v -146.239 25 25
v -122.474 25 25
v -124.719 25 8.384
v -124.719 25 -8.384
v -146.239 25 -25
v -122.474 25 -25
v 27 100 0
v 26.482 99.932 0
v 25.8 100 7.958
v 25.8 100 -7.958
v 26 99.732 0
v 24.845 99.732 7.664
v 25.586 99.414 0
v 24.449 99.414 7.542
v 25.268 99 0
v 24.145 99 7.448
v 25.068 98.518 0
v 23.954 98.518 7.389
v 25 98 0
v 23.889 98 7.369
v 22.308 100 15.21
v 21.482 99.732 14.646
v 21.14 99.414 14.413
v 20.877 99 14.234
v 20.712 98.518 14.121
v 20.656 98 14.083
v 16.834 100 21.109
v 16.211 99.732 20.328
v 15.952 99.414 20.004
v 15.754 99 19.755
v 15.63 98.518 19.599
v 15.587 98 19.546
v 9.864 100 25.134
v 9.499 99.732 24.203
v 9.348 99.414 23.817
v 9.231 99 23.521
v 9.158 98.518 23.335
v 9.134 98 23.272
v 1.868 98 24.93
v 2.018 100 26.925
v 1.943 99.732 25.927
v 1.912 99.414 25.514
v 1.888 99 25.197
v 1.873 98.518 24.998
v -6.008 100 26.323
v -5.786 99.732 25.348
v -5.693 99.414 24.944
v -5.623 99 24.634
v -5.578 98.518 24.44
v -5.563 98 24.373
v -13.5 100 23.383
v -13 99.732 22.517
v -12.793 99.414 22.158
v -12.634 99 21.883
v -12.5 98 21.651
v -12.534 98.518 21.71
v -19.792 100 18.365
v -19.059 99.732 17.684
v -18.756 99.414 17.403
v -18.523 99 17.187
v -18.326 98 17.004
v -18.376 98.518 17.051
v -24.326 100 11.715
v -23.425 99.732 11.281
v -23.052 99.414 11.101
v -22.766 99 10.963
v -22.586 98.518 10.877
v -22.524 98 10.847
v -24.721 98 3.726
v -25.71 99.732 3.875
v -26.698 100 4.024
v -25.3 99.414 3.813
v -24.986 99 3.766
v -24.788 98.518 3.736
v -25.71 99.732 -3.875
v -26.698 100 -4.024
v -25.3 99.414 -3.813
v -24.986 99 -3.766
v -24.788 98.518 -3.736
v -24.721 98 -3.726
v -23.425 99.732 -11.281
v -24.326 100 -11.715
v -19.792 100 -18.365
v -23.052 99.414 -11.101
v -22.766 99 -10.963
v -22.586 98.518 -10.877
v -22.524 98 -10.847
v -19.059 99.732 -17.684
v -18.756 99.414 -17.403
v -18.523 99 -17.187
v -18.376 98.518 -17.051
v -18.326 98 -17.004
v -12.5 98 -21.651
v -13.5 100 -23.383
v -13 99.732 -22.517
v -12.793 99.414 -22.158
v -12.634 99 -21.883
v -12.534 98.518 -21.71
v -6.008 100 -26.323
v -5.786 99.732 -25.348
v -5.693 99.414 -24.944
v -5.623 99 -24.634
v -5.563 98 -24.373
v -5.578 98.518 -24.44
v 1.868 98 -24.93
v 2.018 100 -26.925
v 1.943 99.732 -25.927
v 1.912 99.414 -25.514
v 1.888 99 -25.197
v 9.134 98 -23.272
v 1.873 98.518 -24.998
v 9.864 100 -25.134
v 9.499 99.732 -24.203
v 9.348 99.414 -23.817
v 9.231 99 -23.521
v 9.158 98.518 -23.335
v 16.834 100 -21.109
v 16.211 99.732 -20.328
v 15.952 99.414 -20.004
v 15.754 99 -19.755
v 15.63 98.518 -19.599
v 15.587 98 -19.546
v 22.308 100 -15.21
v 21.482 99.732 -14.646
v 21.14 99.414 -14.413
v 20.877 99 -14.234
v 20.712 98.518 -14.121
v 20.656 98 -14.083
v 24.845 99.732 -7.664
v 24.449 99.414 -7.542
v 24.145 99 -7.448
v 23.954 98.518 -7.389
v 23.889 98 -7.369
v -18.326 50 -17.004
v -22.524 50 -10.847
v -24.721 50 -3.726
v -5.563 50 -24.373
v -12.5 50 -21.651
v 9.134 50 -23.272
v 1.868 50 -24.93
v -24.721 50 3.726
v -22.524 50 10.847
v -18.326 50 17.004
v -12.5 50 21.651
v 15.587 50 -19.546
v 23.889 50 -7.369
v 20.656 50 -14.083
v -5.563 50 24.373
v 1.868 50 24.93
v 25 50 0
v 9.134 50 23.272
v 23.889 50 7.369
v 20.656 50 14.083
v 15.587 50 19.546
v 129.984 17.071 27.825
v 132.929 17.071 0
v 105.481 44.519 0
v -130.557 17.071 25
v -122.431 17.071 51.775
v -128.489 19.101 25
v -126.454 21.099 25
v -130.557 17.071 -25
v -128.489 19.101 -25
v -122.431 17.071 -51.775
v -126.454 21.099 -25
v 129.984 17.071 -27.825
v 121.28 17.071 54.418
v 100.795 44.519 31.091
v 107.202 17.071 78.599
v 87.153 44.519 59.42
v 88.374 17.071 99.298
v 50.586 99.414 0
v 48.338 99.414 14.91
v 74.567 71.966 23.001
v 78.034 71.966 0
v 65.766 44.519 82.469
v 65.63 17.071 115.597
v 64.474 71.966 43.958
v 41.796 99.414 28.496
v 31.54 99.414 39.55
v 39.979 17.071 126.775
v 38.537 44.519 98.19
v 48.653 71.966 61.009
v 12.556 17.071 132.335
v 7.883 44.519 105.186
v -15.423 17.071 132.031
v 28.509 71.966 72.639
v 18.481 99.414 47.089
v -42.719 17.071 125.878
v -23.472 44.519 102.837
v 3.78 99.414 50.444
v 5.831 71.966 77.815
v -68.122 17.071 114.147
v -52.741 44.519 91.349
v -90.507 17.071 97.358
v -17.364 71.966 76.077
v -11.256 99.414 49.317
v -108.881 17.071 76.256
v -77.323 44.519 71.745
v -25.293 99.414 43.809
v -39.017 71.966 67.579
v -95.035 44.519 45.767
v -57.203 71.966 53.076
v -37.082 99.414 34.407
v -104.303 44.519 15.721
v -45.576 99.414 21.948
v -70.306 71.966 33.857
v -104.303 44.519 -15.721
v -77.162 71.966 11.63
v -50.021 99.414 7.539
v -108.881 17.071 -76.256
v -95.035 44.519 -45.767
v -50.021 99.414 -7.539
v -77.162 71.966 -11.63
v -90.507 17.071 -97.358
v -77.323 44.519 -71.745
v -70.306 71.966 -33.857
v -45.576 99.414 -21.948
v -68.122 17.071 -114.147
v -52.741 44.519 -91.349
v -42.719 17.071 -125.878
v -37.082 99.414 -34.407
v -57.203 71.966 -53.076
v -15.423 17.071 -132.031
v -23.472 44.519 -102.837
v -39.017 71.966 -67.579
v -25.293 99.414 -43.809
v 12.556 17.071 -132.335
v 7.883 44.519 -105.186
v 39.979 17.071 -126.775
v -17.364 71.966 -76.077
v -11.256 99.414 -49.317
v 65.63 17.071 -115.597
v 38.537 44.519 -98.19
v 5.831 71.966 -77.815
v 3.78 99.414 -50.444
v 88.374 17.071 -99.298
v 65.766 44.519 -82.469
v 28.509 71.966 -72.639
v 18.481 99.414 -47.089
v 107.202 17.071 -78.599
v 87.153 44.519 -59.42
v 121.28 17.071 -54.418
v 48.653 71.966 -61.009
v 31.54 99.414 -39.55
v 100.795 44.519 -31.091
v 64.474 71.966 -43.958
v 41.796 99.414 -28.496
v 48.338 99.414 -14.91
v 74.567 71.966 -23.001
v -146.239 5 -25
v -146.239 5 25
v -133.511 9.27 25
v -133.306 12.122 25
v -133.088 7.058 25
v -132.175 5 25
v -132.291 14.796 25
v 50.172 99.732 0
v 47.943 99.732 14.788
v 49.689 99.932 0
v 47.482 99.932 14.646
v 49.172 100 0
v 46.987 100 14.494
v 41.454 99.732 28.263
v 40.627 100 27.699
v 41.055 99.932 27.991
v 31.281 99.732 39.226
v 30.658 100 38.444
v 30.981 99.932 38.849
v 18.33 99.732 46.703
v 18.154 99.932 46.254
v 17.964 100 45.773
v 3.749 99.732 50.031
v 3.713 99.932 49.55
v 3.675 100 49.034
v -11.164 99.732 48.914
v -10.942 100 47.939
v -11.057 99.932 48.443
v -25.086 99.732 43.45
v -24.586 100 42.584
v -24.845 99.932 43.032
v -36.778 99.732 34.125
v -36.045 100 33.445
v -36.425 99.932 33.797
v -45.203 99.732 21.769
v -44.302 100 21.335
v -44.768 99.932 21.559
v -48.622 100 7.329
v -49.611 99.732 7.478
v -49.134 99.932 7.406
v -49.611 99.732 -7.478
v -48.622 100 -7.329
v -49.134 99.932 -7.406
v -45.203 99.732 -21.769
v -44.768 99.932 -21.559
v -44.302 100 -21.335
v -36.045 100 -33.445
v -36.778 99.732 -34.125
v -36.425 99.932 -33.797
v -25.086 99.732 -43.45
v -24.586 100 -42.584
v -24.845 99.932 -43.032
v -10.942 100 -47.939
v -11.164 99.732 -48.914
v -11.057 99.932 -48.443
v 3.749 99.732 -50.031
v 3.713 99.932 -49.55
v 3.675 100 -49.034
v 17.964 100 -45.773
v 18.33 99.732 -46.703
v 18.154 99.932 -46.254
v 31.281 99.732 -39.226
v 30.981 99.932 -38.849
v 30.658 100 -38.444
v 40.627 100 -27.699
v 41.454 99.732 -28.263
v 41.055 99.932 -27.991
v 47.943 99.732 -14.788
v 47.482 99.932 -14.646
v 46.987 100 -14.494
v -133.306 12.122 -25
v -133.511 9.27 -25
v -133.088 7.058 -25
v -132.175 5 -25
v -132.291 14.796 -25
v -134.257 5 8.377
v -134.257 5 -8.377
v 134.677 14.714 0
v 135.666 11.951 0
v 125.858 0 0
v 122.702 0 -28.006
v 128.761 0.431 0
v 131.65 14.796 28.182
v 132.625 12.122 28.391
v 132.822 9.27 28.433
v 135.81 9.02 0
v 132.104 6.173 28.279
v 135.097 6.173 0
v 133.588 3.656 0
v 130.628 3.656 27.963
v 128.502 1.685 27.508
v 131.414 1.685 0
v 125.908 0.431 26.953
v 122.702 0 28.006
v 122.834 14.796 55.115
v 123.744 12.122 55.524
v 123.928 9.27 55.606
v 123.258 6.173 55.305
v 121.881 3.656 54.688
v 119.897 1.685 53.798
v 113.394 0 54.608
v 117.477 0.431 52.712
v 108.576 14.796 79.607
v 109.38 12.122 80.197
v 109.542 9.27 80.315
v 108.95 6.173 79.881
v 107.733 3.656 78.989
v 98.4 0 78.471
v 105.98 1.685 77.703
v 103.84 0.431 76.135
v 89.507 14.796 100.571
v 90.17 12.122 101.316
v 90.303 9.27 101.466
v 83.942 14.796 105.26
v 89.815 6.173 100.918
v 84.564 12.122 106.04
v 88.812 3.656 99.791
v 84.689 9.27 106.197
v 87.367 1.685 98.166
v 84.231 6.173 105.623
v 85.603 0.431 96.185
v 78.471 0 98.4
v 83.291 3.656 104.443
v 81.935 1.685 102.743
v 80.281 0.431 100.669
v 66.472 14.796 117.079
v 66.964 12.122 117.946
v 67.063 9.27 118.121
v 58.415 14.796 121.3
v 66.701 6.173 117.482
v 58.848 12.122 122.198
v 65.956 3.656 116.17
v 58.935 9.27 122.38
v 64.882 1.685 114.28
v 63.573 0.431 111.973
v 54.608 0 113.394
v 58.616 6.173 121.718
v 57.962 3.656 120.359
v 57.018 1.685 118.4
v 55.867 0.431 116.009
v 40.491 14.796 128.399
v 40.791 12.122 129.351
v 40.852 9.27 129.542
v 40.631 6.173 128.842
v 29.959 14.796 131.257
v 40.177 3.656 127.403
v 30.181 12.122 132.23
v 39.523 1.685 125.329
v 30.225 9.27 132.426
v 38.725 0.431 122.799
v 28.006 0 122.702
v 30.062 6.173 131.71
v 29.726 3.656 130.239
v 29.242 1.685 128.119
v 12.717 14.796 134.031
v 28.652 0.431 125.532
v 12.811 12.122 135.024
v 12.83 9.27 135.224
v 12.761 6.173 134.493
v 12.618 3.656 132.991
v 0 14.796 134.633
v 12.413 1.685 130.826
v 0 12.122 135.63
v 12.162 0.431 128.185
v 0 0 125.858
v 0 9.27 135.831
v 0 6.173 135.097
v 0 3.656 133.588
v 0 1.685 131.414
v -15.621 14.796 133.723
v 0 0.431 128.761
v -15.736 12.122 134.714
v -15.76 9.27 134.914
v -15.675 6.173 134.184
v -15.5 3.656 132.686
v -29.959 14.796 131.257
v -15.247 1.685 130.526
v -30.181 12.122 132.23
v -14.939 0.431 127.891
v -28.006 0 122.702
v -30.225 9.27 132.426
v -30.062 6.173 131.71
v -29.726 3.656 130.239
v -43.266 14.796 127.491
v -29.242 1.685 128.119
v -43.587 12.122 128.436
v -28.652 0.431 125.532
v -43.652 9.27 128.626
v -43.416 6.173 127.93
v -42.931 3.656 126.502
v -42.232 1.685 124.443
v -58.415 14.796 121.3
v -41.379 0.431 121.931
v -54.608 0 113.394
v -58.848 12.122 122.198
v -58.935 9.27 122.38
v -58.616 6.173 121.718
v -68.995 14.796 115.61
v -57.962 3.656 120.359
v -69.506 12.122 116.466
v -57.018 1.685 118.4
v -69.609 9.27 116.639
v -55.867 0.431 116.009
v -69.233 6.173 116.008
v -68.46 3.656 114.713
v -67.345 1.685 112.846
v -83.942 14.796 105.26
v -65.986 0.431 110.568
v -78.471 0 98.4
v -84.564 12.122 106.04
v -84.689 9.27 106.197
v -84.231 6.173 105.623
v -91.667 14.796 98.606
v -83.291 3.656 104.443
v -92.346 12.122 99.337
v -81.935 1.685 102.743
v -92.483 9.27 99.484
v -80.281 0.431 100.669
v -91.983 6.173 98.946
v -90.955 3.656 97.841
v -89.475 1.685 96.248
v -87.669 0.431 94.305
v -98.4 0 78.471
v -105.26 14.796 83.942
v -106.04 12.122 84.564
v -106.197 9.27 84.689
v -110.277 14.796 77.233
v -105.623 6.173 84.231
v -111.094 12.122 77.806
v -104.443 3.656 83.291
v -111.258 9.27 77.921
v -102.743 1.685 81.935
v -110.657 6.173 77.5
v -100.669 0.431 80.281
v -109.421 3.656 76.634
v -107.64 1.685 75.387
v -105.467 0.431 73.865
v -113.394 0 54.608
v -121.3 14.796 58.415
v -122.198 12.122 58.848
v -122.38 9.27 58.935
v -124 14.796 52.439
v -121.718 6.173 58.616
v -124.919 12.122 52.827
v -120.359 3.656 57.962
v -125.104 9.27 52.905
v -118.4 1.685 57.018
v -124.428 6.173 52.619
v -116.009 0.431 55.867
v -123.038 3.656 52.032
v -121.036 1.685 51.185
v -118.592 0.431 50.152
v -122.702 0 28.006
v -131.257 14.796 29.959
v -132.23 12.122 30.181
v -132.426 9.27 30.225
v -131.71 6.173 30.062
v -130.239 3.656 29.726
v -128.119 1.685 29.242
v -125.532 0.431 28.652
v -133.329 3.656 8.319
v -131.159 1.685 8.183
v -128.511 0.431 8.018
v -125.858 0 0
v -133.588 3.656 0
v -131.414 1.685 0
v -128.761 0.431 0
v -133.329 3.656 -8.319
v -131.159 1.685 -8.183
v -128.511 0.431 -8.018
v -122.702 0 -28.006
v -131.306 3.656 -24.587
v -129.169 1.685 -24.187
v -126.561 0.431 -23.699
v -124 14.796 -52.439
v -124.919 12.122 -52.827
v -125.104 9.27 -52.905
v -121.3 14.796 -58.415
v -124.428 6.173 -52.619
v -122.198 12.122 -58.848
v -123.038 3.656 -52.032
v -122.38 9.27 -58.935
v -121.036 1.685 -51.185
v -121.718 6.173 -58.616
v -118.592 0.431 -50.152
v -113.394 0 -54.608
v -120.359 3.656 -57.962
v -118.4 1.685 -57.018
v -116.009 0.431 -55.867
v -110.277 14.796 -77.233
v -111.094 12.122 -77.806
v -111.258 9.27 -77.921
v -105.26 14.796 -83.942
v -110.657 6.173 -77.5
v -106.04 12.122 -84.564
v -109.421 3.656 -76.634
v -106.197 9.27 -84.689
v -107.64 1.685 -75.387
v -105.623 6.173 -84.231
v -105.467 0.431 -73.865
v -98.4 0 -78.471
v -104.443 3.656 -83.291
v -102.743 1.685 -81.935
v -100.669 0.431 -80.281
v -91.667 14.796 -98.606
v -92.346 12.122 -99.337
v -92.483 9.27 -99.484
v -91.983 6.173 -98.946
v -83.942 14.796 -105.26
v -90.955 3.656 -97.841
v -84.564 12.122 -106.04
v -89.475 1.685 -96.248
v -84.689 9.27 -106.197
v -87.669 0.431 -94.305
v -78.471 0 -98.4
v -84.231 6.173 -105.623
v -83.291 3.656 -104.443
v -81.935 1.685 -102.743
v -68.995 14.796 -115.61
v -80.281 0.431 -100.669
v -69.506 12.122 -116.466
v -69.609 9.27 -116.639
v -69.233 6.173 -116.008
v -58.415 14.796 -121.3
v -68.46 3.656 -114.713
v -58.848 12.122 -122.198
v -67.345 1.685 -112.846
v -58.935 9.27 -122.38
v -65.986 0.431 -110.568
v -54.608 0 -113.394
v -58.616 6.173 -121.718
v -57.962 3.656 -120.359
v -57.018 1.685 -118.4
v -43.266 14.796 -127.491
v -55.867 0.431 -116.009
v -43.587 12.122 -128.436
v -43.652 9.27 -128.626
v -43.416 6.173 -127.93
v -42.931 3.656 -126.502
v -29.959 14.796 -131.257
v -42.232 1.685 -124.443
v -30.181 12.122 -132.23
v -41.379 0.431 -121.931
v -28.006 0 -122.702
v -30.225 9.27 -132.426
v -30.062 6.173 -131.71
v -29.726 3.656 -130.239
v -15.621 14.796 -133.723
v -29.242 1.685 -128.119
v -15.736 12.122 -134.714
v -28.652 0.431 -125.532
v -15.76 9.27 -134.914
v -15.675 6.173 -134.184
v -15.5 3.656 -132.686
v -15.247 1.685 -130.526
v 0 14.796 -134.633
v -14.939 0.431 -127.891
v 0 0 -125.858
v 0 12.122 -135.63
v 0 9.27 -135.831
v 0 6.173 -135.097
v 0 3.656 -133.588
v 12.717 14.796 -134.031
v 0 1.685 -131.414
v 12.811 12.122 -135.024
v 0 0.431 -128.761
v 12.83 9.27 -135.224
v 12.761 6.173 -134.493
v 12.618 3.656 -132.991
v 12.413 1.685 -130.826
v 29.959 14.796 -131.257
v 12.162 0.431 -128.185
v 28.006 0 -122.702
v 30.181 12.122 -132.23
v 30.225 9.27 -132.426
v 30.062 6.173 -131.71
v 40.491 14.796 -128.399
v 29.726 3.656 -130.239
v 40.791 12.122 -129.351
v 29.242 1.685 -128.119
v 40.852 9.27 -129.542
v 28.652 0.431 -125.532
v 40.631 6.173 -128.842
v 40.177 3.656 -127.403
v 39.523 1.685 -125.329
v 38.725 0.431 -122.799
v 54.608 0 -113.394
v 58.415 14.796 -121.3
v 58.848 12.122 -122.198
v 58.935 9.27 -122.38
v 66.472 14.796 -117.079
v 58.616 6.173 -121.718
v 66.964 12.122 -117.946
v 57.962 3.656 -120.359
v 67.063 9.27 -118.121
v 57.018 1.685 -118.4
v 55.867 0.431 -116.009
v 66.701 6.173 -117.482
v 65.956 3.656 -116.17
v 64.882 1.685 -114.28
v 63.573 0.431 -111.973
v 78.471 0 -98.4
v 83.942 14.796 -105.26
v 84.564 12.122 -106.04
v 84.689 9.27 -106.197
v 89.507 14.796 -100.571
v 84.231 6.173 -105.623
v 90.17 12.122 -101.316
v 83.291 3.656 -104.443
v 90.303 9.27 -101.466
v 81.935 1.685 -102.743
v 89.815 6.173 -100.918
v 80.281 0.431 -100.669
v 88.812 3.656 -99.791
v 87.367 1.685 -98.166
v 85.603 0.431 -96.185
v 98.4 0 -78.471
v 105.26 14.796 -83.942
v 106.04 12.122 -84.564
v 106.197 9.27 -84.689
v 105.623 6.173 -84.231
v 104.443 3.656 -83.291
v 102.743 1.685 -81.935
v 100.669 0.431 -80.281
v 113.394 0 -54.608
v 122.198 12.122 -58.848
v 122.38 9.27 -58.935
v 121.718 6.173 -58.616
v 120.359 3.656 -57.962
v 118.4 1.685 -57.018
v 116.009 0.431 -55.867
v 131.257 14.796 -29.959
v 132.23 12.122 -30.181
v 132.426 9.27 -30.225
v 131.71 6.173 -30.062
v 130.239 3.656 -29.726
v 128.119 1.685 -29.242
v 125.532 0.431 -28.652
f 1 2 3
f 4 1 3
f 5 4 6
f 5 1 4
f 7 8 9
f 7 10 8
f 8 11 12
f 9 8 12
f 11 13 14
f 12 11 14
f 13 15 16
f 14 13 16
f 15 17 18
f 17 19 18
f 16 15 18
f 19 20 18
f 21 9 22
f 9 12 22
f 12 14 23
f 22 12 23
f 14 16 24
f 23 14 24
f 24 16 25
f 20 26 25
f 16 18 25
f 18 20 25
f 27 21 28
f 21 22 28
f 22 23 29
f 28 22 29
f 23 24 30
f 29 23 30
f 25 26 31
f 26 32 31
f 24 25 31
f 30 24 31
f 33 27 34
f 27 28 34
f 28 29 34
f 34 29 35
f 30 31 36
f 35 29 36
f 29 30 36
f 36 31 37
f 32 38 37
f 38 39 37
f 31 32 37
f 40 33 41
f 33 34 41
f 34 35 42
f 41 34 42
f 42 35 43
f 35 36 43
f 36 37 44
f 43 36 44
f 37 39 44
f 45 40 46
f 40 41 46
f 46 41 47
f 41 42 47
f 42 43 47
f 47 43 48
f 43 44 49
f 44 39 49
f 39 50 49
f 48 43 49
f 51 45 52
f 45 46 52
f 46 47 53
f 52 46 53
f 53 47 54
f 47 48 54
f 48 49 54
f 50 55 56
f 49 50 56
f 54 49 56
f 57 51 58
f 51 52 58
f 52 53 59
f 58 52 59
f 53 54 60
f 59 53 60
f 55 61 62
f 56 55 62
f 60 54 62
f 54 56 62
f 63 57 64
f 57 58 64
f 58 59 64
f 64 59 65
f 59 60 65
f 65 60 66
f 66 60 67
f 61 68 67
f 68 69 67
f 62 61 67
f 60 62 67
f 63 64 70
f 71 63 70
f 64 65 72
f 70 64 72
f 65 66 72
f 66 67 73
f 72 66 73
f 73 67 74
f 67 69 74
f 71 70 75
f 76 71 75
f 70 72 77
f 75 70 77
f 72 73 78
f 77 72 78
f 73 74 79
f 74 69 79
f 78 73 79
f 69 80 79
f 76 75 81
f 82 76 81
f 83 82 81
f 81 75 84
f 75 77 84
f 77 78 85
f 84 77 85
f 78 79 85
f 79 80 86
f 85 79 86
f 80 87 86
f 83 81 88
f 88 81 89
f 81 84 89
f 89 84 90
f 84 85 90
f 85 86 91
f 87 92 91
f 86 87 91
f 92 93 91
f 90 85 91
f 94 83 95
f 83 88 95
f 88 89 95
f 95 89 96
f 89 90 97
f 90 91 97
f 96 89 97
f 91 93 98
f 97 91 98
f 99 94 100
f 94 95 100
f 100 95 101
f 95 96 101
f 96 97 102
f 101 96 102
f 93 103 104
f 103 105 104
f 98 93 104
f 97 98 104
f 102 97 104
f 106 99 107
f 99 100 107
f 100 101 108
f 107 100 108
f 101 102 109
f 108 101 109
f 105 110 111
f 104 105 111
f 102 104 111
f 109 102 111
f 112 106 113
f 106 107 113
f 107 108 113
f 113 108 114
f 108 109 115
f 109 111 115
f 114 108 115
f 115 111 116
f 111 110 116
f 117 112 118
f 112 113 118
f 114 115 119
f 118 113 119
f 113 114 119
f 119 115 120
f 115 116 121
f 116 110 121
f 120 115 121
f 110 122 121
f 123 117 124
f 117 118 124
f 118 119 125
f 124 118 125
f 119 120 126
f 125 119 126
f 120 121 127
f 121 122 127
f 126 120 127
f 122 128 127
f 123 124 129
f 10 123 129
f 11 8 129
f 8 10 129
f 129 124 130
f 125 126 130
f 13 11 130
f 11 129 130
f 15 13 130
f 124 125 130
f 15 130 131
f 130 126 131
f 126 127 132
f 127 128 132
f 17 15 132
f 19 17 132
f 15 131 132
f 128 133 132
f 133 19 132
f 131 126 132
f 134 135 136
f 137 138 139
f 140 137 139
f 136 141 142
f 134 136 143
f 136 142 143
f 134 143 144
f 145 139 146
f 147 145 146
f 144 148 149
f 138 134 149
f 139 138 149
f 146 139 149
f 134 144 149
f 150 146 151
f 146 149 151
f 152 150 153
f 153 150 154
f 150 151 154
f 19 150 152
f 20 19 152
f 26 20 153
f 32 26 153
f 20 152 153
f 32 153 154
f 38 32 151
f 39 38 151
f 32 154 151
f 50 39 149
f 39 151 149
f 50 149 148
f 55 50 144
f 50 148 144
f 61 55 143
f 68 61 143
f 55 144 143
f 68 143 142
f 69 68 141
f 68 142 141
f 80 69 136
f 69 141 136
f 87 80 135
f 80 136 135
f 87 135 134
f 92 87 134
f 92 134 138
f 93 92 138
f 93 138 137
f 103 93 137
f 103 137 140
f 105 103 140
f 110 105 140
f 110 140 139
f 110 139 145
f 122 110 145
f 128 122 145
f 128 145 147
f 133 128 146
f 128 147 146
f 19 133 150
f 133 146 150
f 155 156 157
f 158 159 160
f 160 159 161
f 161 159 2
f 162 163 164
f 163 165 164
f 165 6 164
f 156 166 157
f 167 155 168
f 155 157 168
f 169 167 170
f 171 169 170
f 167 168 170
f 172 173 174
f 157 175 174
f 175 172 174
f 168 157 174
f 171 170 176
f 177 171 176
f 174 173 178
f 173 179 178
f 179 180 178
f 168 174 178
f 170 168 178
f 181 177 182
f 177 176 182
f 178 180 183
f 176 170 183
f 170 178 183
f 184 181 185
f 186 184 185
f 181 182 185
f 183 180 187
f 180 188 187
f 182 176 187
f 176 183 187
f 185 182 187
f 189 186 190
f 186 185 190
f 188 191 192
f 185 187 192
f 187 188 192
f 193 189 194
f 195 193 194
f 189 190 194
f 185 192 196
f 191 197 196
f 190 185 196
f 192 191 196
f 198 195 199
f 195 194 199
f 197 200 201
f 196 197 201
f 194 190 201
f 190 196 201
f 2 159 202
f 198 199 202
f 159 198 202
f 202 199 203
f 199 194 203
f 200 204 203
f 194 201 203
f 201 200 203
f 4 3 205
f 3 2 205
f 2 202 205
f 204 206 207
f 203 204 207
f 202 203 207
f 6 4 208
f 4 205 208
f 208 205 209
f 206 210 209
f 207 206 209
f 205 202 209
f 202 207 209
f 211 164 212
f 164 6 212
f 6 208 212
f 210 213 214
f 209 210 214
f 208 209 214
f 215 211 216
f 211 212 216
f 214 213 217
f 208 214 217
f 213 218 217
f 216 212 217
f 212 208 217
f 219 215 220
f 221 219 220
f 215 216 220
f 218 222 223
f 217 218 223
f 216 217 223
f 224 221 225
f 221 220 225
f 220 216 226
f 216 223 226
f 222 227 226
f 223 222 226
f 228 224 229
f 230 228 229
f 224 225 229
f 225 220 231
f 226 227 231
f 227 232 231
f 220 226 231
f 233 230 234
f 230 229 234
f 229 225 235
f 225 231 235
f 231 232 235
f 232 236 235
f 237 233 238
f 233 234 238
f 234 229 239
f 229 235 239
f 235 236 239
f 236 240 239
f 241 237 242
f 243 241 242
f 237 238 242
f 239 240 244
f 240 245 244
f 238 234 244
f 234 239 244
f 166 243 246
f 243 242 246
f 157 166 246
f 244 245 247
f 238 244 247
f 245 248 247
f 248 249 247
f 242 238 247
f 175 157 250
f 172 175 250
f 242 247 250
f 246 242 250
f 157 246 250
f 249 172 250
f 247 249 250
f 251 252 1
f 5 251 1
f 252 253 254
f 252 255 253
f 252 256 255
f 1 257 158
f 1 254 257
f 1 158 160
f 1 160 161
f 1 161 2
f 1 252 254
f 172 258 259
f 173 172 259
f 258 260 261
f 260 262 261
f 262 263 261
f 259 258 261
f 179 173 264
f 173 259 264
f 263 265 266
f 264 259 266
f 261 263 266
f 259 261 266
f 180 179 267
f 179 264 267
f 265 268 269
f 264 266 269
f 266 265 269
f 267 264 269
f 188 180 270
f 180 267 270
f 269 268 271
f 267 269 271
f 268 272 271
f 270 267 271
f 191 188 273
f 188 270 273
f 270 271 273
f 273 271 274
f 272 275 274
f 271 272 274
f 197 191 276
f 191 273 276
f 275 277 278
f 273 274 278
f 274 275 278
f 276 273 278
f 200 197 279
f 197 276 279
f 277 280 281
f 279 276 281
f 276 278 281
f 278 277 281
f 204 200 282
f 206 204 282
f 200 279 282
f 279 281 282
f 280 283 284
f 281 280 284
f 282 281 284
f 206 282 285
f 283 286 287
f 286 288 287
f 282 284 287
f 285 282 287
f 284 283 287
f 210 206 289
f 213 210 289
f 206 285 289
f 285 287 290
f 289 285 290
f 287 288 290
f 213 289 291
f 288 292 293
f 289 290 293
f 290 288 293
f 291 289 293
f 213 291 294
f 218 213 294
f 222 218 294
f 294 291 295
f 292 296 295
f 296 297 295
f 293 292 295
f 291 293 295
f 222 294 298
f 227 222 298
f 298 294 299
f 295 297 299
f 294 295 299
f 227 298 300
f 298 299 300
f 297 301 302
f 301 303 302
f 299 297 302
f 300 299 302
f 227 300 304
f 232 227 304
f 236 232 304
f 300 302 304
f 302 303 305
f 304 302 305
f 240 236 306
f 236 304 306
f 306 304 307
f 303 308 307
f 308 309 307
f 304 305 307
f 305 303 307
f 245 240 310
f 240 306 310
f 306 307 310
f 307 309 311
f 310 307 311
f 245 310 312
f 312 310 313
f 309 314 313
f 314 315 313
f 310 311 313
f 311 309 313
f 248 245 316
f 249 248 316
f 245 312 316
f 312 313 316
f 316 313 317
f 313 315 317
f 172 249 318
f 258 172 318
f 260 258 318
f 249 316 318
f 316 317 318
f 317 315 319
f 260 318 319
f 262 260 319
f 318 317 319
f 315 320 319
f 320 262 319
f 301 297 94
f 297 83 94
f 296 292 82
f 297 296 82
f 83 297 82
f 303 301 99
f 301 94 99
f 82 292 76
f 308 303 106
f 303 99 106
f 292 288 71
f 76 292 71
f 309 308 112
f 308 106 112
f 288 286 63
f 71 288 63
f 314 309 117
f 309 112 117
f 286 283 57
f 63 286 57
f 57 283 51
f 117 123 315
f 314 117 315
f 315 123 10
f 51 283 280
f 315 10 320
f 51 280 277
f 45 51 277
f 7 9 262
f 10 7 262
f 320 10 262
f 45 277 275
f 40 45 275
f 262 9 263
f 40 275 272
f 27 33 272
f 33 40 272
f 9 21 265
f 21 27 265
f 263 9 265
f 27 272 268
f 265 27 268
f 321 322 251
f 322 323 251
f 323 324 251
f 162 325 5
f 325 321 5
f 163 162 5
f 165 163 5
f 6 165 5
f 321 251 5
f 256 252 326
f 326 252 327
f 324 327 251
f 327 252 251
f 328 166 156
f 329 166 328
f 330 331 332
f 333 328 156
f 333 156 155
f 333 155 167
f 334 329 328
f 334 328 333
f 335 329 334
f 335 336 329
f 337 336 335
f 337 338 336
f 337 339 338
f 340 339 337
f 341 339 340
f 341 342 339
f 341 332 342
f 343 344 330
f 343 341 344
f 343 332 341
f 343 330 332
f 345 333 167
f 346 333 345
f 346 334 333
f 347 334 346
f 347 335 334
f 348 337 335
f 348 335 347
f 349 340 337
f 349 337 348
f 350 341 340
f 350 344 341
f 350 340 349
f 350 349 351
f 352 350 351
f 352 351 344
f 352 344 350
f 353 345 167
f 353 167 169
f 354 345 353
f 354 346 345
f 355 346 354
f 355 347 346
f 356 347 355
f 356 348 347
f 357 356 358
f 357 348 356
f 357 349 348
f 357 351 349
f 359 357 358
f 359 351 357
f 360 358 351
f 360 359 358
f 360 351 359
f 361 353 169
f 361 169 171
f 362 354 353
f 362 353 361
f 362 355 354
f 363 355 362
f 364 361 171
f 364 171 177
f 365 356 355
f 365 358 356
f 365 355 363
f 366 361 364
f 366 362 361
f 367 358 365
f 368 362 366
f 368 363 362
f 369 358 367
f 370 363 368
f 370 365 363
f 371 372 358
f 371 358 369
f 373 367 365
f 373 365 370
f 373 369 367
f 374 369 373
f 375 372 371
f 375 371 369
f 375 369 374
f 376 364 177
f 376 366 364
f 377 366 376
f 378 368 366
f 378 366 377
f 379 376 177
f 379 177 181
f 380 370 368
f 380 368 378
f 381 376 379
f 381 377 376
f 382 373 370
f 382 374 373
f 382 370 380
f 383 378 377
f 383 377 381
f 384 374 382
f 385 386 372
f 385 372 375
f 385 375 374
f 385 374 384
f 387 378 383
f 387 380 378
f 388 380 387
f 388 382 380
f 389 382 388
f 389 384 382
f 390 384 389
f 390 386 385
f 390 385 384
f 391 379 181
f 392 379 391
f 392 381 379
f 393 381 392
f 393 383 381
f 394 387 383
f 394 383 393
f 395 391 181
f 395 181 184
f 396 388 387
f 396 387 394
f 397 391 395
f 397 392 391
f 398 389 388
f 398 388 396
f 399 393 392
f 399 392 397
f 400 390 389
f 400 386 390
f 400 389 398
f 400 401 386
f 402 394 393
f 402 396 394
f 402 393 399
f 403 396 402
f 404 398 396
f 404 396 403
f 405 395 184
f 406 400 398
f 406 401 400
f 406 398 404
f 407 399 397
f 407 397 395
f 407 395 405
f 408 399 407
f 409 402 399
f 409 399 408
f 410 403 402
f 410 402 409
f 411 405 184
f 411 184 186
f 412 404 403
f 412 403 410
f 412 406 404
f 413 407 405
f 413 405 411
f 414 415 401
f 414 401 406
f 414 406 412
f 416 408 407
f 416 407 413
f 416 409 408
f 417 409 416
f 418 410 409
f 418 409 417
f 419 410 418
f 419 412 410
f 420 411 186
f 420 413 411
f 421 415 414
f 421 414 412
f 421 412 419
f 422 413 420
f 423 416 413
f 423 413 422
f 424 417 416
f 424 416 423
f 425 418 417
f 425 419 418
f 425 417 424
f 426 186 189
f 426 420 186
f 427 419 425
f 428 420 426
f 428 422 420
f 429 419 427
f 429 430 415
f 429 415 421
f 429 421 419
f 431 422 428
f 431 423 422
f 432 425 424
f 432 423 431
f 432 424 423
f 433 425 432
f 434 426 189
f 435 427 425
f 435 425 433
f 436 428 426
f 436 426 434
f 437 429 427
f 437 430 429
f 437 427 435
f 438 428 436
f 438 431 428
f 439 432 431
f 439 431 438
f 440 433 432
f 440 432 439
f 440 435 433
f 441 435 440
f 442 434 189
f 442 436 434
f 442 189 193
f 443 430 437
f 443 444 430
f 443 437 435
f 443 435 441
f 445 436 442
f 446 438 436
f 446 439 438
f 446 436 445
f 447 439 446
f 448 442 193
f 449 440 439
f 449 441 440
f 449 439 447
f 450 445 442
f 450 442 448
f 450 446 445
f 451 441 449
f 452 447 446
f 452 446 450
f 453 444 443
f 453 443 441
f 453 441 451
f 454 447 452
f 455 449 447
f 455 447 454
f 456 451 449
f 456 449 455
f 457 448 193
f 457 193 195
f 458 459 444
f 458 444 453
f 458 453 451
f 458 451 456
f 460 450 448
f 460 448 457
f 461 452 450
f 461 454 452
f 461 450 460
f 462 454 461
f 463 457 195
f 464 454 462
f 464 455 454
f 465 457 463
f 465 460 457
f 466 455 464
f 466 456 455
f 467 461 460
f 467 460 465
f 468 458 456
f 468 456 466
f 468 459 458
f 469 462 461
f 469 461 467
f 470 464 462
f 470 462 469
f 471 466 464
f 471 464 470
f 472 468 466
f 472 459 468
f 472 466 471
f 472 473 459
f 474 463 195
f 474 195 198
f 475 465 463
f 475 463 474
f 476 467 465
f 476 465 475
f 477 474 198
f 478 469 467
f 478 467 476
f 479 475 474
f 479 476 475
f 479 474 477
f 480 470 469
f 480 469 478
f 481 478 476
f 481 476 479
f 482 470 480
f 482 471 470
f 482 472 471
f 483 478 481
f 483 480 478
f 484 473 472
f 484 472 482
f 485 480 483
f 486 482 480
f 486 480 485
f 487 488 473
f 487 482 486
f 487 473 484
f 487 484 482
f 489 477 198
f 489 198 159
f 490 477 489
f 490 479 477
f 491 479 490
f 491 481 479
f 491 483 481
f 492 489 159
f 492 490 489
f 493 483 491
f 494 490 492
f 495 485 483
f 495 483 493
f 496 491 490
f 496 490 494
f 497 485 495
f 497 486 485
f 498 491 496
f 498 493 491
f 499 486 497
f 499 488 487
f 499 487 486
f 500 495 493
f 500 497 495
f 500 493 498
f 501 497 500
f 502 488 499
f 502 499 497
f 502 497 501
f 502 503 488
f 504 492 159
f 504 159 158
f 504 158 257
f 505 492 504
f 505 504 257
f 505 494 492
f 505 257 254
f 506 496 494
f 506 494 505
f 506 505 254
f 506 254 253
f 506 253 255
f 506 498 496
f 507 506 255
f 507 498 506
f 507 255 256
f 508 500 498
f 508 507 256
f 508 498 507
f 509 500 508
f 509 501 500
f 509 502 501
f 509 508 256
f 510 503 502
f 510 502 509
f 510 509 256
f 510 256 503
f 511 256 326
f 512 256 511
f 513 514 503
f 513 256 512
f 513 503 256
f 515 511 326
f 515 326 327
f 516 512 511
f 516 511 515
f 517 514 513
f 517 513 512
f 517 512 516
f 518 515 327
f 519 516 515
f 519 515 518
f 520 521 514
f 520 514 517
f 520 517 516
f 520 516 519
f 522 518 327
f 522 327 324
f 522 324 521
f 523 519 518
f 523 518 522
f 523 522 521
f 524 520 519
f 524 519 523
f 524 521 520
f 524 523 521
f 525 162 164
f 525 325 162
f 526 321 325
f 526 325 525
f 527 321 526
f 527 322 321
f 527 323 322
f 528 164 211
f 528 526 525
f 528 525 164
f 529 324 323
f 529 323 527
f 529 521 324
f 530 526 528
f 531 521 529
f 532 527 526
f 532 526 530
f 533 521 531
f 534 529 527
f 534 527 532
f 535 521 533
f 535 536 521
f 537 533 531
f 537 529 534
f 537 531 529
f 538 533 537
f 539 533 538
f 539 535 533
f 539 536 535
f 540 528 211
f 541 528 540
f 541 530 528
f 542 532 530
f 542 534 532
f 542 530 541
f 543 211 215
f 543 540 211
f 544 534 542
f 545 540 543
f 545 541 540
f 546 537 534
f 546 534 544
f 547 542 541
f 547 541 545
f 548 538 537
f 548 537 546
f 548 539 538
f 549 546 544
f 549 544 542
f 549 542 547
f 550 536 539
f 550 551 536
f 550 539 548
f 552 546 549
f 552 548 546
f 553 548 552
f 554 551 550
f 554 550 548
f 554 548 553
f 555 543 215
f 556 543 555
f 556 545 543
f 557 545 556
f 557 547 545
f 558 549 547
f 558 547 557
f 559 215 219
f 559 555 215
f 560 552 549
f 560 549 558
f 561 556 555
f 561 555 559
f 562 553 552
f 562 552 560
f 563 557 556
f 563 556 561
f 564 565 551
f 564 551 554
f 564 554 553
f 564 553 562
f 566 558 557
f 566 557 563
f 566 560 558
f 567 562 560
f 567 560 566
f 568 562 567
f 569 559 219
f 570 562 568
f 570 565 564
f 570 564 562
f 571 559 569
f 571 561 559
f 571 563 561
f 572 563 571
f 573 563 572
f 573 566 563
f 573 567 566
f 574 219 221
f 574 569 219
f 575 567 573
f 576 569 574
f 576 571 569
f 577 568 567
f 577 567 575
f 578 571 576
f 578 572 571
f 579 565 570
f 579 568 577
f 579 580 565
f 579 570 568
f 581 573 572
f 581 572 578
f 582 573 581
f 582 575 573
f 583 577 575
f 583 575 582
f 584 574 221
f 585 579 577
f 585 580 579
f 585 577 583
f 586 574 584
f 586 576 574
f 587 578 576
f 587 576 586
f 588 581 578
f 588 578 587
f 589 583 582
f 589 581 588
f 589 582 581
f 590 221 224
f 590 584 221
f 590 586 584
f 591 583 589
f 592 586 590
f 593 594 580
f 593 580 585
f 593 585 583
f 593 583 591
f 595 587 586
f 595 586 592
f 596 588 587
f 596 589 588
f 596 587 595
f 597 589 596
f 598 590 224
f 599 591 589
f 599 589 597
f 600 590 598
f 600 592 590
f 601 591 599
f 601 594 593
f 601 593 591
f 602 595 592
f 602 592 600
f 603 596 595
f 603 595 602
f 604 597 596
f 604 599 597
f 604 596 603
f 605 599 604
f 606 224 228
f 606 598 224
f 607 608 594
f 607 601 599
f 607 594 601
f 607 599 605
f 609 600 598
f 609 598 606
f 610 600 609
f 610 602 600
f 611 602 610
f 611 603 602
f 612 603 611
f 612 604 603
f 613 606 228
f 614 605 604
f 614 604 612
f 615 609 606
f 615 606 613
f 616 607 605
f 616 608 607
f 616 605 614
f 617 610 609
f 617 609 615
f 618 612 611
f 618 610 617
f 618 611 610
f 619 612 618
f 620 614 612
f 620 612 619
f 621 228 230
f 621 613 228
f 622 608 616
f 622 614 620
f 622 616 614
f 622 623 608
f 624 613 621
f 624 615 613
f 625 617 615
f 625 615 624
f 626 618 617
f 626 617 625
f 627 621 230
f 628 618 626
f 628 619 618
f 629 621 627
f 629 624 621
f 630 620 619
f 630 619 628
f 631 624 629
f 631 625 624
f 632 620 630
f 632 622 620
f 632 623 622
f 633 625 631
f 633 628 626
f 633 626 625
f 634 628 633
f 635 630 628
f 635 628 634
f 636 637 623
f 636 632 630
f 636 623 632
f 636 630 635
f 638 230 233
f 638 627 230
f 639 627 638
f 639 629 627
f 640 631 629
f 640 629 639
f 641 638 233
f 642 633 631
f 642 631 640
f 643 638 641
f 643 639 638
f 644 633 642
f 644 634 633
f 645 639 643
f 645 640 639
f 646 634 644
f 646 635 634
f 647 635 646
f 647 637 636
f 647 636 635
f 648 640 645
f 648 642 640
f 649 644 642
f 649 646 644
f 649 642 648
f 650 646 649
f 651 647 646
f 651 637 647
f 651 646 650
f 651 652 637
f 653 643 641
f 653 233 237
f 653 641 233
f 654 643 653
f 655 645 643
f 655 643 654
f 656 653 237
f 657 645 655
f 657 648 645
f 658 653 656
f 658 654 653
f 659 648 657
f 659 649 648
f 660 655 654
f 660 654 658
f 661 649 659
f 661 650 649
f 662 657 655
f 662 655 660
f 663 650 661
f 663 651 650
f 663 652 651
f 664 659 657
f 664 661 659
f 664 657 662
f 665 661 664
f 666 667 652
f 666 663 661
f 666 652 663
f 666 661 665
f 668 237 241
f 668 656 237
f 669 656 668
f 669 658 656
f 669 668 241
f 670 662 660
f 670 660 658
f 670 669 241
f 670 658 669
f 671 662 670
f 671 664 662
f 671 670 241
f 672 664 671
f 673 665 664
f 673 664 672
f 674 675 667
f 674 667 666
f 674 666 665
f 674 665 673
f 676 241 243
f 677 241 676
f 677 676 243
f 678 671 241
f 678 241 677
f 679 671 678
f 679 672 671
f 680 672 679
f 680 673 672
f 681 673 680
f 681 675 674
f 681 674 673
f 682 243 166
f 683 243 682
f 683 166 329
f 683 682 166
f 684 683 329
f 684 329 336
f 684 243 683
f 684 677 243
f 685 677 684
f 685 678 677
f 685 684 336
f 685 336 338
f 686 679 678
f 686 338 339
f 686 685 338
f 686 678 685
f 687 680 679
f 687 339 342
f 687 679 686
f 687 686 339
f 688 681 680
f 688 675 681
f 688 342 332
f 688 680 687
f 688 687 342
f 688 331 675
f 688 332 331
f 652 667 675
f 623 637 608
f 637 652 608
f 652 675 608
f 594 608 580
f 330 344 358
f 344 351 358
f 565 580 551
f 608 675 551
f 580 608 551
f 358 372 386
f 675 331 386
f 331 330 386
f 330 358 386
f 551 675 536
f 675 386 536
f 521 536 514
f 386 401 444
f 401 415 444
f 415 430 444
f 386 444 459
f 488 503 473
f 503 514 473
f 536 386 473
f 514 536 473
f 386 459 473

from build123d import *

# Parameters (mm, degrees)
FILLET1_R           = 2
FILLET2_R           = 10
SKETCH3_W           = 10
SKETCH3_H           = 20
BOSS_EXTRUDE1_DEPTH = 25
BOSS_EXTRUDE2_REACH = 322.147
SKETCH4_W           = 50
SKETCH4_H           = 20


with BuildPart() as part:
    # Sketch1 → Revolve1 (revolve)
    with BuildSketch(Plane.XY):
        Polygon((0, 0), (150, 0), (50, 100), (25, 100), (25, 50), (0, 50), align=None)
    revolve(axis=Axis((0, 50, 0), (0, -1, 0)))

    # Fillet1
    fillet1_edges = [part.edges().sort_by_distance(p)[0] for p in [
        (-25, 100, 0),
        (-50, 100, 0),
    ]]
    fillet(fillet1_edges, radius=FILLET1_R)

    # Fillet2
    fillet2_edges = [part.edges().sort_by_distance(p)[0] for p in [
        (-150, 0, 0),
    ]]
    fillet(fillet2_edges, radius=FILLET2_R)

    # Sketch4 → Boss-Extrude2 (add, up to next)
    with BuildSketch(Plane(origin=(-136.238585348, 0, 0), x_dir=(0, 0, -1), z_dir=(1, 0, 0)), mode=Mode.PRIVATE) as boss_extrude2_sk1:
        with Locations((0, 15)):
            Rectangle(SKETCH4_W, SKETCH4_H)
    boss_extrude2_tool1 = extrude(boss_extrude2_sk1.sketch, amount=BOSS_EXTRUDE2_REACH, mode=Mode.PRIVATE) - part.part


with BuildPart() as body_2:
    # Sketch3 → Boss-Extrude1 (new, symmetric)
    with BuildSketch(Plane.XY):
        with Locations((-141.238585348, 15)):
            Rectangle(SKETCH3_W, SKETCH3_H)
    extrude(amount=BOSS_EXTRUDE1_DEPTH, both=True)


with BuildPart() as part_1:
    add(part.part)

    add(body_2.part)  # Boss-Extrude2 merges body 2
    add(boss_extrude2_tool1.solids().sort_by_distance((-136.238585, 15, 0))[0])


solid = part_1.part
